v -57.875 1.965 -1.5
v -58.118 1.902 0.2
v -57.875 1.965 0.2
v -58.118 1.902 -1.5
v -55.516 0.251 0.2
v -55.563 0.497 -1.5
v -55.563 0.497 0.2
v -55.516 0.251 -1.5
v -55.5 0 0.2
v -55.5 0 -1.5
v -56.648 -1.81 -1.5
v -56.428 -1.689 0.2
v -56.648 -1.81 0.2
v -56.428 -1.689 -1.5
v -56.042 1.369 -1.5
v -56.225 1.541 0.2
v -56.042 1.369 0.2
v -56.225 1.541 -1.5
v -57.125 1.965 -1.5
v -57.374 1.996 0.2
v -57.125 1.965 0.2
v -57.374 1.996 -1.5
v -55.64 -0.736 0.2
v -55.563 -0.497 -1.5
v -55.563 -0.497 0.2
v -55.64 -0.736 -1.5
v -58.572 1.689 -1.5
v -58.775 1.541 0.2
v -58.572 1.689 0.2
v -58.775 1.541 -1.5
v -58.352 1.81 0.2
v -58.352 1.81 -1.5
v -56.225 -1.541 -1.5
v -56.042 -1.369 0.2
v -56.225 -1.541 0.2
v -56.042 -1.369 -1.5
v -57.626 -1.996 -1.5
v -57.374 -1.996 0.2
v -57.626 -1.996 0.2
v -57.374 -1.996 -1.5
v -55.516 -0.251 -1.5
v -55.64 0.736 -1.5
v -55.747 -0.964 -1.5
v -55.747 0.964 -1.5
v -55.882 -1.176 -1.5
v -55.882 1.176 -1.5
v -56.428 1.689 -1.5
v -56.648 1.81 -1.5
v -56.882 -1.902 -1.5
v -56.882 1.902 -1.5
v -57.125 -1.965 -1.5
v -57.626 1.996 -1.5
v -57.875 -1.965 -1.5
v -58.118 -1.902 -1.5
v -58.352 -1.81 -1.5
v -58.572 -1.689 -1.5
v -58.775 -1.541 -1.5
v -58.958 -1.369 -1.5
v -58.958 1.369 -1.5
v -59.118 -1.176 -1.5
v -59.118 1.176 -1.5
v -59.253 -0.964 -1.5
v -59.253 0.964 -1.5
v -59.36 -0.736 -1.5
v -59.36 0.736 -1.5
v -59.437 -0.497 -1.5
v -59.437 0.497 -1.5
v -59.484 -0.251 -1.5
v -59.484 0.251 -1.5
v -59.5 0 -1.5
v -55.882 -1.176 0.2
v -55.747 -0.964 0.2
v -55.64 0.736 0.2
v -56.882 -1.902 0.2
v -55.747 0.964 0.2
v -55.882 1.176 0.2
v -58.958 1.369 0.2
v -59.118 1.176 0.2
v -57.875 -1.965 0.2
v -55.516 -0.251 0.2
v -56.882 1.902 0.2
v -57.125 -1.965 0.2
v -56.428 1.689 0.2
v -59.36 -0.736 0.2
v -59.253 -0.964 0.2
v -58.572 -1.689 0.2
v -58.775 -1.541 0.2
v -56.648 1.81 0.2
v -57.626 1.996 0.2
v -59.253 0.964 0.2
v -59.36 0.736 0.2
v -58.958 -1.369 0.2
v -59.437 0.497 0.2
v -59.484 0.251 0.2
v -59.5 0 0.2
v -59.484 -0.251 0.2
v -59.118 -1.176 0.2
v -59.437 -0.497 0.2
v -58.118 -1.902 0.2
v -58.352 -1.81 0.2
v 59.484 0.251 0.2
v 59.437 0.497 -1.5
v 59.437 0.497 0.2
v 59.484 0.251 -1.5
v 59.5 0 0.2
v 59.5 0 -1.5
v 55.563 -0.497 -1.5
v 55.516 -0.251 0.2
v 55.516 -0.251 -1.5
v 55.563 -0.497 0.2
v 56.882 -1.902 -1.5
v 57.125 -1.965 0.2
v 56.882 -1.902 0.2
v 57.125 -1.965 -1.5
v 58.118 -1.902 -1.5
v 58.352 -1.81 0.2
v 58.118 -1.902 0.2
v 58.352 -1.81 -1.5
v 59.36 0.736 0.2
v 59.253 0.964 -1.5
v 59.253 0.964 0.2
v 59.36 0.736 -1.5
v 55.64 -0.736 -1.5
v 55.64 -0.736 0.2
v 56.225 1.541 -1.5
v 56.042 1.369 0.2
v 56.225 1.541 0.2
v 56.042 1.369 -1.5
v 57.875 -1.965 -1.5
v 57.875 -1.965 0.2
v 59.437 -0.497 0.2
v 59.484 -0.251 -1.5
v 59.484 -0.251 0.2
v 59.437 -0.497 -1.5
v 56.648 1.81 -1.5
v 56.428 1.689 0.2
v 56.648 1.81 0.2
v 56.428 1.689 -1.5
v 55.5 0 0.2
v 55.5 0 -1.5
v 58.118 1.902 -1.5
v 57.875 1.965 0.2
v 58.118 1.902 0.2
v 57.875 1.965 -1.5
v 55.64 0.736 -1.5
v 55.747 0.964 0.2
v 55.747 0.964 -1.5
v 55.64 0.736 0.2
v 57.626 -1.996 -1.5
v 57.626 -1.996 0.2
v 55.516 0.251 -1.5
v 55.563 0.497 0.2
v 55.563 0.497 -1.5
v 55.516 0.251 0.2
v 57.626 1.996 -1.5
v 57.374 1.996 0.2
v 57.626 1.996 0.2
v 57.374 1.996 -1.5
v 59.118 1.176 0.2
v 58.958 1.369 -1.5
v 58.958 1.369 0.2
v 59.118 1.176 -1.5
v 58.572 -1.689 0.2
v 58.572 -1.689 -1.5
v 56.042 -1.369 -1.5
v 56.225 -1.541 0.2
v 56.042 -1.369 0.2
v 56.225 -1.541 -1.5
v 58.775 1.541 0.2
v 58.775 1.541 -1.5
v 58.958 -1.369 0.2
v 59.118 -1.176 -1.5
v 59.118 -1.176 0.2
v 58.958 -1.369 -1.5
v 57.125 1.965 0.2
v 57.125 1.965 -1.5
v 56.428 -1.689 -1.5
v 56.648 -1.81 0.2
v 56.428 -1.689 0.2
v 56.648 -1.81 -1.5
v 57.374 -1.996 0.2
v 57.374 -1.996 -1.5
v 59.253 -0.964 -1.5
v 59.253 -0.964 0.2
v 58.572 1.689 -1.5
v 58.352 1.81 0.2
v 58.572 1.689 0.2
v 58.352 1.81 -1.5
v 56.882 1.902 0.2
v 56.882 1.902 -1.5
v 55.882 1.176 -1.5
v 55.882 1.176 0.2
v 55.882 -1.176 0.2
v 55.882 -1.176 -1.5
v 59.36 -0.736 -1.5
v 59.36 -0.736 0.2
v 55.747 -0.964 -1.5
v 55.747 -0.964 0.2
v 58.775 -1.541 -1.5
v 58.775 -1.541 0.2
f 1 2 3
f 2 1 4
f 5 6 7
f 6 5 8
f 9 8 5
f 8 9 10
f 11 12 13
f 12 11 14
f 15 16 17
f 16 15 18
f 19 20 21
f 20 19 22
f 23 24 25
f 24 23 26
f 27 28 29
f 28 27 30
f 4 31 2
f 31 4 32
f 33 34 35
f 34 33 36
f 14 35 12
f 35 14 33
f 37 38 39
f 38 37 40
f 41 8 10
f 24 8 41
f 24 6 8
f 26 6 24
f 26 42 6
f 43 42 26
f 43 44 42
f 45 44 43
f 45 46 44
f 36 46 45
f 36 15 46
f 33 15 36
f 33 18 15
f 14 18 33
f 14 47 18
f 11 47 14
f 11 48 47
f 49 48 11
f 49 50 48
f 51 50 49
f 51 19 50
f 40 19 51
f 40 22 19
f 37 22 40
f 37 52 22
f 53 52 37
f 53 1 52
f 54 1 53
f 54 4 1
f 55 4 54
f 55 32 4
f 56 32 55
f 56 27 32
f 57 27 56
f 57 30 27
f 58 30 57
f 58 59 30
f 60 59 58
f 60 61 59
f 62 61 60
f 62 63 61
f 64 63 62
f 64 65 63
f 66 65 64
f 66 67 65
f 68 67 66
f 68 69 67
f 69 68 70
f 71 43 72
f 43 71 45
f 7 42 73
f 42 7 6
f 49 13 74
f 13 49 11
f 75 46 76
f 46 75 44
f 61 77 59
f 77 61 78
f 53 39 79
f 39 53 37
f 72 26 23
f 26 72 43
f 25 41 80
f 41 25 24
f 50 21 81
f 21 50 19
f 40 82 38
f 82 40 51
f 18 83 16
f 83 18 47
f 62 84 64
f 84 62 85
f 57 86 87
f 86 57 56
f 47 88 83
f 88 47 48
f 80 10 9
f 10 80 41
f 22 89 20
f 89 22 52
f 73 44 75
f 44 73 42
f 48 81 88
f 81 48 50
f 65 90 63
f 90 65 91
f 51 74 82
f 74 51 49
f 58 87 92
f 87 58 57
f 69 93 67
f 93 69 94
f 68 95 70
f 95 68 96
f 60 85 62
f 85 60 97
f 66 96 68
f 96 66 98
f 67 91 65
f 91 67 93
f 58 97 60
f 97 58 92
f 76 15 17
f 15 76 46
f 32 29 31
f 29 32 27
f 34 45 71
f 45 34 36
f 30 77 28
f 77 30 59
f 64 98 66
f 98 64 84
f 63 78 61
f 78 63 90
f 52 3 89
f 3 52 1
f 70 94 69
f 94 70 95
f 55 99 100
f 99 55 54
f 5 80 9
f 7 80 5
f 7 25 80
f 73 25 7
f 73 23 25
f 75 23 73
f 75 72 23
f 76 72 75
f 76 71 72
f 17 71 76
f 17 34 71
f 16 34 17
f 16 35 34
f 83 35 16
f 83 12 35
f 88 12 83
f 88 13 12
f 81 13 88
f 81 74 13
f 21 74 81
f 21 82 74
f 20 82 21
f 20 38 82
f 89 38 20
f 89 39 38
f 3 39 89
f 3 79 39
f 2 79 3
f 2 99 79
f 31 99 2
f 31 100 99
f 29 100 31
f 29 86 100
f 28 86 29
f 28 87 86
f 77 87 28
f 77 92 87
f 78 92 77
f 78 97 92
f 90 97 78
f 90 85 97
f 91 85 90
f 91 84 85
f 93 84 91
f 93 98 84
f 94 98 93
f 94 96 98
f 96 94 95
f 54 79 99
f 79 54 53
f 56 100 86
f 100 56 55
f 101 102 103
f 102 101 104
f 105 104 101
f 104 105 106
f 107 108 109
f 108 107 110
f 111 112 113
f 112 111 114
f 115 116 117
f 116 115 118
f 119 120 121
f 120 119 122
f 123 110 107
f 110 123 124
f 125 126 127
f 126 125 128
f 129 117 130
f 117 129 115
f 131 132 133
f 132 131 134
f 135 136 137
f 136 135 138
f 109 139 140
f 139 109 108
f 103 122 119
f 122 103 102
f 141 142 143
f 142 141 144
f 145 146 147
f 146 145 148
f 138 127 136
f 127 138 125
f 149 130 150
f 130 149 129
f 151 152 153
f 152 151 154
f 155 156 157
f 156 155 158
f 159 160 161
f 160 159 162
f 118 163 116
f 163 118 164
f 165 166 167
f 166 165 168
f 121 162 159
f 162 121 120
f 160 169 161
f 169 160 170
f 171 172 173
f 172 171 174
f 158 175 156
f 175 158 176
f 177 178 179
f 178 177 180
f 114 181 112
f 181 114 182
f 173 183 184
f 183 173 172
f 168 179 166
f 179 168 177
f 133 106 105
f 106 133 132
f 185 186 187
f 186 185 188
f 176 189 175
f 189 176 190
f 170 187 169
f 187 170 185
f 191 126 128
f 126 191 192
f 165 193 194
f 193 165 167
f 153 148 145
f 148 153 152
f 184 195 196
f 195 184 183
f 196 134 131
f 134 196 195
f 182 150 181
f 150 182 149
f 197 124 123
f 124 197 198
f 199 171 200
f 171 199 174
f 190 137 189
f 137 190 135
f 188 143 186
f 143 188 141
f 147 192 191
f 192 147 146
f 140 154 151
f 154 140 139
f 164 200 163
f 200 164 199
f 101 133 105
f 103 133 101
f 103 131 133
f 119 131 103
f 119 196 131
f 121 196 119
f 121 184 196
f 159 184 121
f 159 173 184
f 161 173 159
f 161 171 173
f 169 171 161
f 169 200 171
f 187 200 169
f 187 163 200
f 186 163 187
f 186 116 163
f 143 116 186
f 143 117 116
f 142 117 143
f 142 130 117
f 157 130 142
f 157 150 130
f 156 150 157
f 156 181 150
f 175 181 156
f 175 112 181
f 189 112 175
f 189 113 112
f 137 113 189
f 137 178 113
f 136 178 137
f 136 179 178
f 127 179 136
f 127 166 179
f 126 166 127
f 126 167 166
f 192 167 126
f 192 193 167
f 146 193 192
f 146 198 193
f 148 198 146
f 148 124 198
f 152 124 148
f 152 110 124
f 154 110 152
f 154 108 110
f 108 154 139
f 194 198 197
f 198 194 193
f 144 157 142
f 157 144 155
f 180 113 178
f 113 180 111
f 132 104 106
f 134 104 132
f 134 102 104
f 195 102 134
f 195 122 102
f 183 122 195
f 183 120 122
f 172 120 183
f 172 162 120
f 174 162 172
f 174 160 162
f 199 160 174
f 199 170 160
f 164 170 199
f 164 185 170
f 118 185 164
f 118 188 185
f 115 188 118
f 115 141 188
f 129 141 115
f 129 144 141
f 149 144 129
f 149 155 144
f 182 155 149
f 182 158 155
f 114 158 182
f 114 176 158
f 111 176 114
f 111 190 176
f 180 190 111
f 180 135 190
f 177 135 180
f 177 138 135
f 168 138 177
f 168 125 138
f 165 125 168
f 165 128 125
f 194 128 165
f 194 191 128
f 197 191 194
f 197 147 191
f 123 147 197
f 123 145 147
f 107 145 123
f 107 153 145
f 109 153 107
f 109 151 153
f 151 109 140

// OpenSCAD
module Standoff(h, r1, r2){
  difference() {
    cylinder(h=h, r=r1, $fn=50);
    cylinder(h=h+0.01, r=r2, $fn=50);
  }
}

module PiMount(){
  cube([85, 56, 1]);
  translate([24.05, 16.55, 1]) Standoff(6, 3, 1.5);
  translate([78.55, 44.95, 1]) Standoff(6, 3, 1.5);
}

module RelayMount(height){
  cube([75, 55, 1]);
  inner = 1.4;
  outer = 3;
  translate([3, 3, 1]) Standoff(height, outer, inner);
  translate([72, 3, 1]) Standoff(height, outer, inner);
  translate([3, 52, 1]) Standoff(height, outer, inner);
  translate([72, 52, 1]) Standoff(height, outer, inner);
}

module BarrierStripMount(depth){
  translate([5, 11, -depth]) cylinder(h=depth+0.2, r=2, $fn=50);
  translate([120, 11, -depth]) cylinder(h=depth+0.2, r=2, $fn=50);
}

translate([-62.5, -11, 0]) difference(){
  BarrierStripMount(depth=1.5);
}
